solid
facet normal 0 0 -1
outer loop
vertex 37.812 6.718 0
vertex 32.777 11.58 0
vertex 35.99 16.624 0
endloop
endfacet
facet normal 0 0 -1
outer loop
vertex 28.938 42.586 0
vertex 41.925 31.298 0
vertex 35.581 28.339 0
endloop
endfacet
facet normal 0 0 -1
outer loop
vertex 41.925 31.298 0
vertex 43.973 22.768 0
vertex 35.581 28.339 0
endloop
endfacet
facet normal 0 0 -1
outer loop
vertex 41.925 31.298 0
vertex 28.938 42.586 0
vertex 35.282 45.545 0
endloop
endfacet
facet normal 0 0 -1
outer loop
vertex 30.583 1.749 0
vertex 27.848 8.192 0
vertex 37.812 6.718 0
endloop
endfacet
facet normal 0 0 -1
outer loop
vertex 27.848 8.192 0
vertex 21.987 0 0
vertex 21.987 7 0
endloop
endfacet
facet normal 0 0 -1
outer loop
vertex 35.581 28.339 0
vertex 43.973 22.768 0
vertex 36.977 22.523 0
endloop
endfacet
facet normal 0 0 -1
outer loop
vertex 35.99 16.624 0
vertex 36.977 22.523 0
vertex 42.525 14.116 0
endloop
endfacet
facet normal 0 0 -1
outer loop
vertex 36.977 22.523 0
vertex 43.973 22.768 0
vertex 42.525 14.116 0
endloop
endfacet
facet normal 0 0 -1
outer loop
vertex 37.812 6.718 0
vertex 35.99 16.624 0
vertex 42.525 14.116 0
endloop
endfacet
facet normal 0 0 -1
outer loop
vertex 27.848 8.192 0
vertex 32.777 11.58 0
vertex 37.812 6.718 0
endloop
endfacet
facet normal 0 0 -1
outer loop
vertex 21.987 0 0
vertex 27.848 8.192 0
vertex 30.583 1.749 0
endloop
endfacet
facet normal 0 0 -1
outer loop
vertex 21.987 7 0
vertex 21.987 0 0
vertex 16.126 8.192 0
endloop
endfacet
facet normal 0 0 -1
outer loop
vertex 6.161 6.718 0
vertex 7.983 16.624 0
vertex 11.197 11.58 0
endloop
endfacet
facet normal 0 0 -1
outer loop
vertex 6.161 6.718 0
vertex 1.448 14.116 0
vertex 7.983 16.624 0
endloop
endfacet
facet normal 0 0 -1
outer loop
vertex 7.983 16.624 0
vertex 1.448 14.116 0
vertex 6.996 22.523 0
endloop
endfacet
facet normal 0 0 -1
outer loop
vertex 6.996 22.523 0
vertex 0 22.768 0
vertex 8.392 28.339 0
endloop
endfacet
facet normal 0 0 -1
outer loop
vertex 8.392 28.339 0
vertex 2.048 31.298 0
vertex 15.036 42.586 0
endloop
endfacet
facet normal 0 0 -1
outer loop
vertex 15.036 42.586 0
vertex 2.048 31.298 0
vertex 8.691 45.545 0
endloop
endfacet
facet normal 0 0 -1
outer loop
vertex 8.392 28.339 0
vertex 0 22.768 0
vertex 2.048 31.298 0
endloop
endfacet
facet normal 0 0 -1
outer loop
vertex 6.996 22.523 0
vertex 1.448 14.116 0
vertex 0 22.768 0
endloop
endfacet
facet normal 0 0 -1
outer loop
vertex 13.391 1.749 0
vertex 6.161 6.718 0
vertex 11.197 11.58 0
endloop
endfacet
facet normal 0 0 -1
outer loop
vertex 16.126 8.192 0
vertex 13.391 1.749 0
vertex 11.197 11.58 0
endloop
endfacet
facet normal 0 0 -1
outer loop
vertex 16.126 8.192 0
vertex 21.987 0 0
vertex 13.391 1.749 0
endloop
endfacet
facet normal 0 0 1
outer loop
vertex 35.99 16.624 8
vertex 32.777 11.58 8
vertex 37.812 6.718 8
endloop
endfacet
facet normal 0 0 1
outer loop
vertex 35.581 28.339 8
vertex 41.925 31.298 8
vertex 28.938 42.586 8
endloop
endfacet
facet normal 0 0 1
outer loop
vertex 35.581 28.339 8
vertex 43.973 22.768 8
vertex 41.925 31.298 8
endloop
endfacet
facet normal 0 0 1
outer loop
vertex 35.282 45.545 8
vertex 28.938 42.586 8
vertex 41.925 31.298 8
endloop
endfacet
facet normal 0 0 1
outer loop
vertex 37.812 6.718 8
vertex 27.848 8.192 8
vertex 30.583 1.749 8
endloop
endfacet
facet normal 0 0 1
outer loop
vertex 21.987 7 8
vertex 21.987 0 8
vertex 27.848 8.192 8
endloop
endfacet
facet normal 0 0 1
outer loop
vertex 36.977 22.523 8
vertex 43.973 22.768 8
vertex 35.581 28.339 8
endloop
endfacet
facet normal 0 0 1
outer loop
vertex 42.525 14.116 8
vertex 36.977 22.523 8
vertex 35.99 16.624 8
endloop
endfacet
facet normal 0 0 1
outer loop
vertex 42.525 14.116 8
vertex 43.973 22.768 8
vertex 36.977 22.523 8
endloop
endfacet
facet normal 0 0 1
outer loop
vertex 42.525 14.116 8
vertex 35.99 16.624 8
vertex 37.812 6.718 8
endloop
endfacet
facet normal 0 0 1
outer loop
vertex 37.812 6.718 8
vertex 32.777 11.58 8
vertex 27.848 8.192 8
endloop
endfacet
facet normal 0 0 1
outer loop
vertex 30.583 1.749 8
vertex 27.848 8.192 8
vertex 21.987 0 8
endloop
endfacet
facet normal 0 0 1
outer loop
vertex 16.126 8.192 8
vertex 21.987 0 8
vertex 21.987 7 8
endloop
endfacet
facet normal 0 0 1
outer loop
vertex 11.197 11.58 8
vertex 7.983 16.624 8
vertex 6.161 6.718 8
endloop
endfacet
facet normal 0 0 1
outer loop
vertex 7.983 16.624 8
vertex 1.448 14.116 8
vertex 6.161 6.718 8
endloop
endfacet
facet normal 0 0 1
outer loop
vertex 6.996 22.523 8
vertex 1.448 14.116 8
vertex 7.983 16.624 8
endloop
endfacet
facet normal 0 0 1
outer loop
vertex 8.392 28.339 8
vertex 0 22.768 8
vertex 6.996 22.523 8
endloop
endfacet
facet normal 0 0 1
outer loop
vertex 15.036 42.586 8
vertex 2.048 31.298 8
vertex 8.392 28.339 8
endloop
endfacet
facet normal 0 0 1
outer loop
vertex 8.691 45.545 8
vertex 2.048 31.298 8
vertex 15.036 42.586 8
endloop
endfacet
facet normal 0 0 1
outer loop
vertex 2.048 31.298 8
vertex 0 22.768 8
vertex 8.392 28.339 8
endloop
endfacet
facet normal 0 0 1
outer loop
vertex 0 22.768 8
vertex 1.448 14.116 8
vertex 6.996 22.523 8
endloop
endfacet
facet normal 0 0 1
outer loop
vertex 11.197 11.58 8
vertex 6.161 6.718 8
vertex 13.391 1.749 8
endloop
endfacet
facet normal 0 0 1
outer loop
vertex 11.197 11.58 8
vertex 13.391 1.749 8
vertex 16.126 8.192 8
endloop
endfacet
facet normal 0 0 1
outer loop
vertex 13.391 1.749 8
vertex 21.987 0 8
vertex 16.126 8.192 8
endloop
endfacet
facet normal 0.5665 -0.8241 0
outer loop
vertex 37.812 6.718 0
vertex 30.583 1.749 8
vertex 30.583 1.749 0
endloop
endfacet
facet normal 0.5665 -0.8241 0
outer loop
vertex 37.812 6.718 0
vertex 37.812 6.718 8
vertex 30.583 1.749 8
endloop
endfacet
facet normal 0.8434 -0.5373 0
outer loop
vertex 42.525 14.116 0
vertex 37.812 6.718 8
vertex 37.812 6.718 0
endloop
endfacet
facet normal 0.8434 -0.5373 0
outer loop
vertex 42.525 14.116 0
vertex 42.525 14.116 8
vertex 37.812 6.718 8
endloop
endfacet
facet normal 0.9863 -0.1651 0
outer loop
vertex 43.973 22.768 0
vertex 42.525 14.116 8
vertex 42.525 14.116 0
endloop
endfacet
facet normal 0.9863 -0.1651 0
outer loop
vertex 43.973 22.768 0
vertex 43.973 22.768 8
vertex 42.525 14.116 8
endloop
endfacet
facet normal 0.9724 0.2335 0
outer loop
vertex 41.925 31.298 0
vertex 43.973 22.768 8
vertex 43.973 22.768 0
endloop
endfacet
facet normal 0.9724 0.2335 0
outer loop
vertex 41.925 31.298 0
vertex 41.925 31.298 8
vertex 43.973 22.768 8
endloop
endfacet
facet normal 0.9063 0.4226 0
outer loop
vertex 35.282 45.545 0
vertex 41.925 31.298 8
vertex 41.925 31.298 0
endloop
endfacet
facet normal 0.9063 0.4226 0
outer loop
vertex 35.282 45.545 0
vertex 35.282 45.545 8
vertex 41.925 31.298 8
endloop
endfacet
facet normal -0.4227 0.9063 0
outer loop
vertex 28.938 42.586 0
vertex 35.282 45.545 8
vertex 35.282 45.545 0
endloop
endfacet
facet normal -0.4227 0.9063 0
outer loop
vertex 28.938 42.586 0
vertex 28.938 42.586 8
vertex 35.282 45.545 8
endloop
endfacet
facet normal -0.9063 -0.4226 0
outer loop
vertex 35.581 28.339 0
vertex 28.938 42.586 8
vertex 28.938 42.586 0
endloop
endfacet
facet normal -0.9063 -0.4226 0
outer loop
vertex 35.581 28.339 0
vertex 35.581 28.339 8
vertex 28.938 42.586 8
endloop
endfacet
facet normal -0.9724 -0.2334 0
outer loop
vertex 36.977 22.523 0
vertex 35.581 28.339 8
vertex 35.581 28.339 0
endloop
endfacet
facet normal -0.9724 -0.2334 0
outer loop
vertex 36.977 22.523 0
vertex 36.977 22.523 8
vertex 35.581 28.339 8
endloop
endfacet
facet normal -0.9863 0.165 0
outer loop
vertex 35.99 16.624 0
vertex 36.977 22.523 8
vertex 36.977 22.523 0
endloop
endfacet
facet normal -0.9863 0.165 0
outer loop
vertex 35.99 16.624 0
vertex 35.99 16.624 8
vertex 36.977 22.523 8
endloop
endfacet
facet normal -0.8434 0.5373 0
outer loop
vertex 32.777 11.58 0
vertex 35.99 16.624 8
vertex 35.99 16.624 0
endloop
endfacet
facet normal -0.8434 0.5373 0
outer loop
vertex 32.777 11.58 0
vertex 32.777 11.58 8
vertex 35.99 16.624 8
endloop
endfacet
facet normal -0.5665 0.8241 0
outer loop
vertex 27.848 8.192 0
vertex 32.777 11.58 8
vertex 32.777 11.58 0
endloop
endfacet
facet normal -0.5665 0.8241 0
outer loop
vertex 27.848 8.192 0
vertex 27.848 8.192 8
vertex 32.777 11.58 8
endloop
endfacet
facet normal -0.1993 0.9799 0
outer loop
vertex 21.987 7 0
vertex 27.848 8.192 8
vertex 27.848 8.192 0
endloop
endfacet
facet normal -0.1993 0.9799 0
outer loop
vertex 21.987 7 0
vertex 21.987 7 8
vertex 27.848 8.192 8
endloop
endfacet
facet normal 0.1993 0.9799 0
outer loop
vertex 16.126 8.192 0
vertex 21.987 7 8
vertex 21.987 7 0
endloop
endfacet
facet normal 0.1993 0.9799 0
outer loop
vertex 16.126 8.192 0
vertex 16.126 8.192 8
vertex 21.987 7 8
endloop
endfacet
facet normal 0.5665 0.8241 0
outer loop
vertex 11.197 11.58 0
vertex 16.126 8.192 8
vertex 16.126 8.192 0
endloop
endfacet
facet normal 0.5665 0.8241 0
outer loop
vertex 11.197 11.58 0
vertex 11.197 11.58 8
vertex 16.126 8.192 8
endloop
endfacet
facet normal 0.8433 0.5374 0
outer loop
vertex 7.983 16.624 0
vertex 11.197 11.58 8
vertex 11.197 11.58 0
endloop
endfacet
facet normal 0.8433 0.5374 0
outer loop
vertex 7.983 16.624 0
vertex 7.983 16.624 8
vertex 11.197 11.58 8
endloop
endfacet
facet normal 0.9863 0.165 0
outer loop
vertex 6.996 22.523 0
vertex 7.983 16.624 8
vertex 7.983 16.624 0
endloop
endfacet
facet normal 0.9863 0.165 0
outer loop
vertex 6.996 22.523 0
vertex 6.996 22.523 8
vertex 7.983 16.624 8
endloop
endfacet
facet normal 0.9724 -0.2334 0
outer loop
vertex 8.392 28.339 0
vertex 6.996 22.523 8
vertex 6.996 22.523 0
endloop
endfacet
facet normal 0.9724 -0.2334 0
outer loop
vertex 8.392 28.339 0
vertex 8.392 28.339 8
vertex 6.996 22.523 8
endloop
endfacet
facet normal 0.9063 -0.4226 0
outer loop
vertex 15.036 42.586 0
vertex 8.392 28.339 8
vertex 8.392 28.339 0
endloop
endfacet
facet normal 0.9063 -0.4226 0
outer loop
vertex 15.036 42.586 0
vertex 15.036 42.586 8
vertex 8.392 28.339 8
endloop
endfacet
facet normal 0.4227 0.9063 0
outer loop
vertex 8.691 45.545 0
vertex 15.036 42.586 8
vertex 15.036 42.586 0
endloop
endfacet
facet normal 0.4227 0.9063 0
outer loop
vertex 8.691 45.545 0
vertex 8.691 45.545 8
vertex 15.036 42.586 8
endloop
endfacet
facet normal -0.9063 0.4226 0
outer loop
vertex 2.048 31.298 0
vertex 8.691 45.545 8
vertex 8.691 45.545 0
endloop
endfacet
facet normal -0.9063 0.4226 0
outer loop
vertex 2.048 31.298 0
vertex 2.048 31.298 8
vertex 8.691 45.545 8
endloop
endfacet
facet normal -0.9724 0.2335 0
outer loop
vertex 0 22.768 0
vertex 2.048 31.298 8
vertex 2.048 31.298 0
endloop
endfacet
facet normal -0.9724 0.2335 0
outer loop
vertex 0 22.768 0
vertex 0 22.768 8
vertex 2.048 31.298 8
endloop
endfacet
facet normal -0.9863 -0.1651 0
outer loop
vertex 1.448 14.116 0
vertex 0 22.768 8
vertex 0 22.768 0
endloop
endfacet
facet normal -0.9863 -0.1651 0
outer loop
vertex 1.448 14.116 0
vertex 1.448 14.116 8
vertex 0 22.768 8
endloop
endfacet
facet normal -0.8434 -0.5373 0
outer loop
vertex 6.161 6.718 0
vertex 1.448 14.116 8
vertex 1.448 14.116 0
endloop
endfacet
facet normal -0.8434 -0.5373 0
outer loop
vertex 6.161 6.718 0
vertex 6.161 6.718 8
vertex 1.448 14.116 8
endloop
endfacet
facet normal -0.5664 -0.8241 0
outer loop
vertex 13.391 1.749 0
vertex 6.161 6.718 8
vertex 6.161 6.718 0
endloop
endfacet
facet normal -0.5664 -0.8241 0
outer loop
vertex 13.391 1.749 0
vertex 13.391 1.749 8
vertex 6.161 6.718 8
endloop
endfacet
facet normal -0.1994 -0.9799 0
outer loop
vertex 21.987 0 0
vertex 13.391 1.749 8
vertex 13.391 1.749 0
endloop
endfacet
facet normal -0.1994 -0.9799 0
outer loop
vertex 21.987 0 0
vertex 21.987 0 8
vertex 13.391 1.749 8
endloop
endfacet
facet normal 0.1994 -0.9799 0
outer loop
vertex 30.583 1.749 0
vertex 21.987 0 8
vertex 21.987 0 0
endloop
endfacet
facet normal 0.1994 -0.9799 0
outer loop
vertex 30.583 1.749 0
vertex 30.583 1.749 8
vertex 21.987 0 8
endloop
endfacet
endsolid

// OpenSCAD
$fn = 32;

// ----------------------------------------------------------------------
// Clip blank: omega clip, 8 mm thick
// ----------------------------------------------------------------------

// --- parameters (mm) ---
profile_height = 8;       // extrusion height
profile_points = 26;      // points of the closed outline

profile = [[2.048, 31.298], [0, 22.768], [1.448, 14.116], [6.161, 6.718], [13.391, 1.749], [21.987, 0], [30.583, 1.749], [37.812, 6.718], [42.525, 14.116], [43.973, 22.768], [41.925, 31.298], [35.282, 45.545], [28.938, 42.586], [35.581, 28.339], [36.977, 22.523], [35.99, 16.624], [32.777, 11.58], [27.848, 8.192], [21.987, 7], [16.126, 8.192], [11.197, 11.58], [7.983, 16.624], [6.996, 22.523], [8.392, 28.339], [15.036, 42.586], [8.691, 45.545]];  // single closed polygon, 26 points, counter clockwise

// --- the one profile operation ---
linear_extrude(height = profile_height) polygon(points = profile);
